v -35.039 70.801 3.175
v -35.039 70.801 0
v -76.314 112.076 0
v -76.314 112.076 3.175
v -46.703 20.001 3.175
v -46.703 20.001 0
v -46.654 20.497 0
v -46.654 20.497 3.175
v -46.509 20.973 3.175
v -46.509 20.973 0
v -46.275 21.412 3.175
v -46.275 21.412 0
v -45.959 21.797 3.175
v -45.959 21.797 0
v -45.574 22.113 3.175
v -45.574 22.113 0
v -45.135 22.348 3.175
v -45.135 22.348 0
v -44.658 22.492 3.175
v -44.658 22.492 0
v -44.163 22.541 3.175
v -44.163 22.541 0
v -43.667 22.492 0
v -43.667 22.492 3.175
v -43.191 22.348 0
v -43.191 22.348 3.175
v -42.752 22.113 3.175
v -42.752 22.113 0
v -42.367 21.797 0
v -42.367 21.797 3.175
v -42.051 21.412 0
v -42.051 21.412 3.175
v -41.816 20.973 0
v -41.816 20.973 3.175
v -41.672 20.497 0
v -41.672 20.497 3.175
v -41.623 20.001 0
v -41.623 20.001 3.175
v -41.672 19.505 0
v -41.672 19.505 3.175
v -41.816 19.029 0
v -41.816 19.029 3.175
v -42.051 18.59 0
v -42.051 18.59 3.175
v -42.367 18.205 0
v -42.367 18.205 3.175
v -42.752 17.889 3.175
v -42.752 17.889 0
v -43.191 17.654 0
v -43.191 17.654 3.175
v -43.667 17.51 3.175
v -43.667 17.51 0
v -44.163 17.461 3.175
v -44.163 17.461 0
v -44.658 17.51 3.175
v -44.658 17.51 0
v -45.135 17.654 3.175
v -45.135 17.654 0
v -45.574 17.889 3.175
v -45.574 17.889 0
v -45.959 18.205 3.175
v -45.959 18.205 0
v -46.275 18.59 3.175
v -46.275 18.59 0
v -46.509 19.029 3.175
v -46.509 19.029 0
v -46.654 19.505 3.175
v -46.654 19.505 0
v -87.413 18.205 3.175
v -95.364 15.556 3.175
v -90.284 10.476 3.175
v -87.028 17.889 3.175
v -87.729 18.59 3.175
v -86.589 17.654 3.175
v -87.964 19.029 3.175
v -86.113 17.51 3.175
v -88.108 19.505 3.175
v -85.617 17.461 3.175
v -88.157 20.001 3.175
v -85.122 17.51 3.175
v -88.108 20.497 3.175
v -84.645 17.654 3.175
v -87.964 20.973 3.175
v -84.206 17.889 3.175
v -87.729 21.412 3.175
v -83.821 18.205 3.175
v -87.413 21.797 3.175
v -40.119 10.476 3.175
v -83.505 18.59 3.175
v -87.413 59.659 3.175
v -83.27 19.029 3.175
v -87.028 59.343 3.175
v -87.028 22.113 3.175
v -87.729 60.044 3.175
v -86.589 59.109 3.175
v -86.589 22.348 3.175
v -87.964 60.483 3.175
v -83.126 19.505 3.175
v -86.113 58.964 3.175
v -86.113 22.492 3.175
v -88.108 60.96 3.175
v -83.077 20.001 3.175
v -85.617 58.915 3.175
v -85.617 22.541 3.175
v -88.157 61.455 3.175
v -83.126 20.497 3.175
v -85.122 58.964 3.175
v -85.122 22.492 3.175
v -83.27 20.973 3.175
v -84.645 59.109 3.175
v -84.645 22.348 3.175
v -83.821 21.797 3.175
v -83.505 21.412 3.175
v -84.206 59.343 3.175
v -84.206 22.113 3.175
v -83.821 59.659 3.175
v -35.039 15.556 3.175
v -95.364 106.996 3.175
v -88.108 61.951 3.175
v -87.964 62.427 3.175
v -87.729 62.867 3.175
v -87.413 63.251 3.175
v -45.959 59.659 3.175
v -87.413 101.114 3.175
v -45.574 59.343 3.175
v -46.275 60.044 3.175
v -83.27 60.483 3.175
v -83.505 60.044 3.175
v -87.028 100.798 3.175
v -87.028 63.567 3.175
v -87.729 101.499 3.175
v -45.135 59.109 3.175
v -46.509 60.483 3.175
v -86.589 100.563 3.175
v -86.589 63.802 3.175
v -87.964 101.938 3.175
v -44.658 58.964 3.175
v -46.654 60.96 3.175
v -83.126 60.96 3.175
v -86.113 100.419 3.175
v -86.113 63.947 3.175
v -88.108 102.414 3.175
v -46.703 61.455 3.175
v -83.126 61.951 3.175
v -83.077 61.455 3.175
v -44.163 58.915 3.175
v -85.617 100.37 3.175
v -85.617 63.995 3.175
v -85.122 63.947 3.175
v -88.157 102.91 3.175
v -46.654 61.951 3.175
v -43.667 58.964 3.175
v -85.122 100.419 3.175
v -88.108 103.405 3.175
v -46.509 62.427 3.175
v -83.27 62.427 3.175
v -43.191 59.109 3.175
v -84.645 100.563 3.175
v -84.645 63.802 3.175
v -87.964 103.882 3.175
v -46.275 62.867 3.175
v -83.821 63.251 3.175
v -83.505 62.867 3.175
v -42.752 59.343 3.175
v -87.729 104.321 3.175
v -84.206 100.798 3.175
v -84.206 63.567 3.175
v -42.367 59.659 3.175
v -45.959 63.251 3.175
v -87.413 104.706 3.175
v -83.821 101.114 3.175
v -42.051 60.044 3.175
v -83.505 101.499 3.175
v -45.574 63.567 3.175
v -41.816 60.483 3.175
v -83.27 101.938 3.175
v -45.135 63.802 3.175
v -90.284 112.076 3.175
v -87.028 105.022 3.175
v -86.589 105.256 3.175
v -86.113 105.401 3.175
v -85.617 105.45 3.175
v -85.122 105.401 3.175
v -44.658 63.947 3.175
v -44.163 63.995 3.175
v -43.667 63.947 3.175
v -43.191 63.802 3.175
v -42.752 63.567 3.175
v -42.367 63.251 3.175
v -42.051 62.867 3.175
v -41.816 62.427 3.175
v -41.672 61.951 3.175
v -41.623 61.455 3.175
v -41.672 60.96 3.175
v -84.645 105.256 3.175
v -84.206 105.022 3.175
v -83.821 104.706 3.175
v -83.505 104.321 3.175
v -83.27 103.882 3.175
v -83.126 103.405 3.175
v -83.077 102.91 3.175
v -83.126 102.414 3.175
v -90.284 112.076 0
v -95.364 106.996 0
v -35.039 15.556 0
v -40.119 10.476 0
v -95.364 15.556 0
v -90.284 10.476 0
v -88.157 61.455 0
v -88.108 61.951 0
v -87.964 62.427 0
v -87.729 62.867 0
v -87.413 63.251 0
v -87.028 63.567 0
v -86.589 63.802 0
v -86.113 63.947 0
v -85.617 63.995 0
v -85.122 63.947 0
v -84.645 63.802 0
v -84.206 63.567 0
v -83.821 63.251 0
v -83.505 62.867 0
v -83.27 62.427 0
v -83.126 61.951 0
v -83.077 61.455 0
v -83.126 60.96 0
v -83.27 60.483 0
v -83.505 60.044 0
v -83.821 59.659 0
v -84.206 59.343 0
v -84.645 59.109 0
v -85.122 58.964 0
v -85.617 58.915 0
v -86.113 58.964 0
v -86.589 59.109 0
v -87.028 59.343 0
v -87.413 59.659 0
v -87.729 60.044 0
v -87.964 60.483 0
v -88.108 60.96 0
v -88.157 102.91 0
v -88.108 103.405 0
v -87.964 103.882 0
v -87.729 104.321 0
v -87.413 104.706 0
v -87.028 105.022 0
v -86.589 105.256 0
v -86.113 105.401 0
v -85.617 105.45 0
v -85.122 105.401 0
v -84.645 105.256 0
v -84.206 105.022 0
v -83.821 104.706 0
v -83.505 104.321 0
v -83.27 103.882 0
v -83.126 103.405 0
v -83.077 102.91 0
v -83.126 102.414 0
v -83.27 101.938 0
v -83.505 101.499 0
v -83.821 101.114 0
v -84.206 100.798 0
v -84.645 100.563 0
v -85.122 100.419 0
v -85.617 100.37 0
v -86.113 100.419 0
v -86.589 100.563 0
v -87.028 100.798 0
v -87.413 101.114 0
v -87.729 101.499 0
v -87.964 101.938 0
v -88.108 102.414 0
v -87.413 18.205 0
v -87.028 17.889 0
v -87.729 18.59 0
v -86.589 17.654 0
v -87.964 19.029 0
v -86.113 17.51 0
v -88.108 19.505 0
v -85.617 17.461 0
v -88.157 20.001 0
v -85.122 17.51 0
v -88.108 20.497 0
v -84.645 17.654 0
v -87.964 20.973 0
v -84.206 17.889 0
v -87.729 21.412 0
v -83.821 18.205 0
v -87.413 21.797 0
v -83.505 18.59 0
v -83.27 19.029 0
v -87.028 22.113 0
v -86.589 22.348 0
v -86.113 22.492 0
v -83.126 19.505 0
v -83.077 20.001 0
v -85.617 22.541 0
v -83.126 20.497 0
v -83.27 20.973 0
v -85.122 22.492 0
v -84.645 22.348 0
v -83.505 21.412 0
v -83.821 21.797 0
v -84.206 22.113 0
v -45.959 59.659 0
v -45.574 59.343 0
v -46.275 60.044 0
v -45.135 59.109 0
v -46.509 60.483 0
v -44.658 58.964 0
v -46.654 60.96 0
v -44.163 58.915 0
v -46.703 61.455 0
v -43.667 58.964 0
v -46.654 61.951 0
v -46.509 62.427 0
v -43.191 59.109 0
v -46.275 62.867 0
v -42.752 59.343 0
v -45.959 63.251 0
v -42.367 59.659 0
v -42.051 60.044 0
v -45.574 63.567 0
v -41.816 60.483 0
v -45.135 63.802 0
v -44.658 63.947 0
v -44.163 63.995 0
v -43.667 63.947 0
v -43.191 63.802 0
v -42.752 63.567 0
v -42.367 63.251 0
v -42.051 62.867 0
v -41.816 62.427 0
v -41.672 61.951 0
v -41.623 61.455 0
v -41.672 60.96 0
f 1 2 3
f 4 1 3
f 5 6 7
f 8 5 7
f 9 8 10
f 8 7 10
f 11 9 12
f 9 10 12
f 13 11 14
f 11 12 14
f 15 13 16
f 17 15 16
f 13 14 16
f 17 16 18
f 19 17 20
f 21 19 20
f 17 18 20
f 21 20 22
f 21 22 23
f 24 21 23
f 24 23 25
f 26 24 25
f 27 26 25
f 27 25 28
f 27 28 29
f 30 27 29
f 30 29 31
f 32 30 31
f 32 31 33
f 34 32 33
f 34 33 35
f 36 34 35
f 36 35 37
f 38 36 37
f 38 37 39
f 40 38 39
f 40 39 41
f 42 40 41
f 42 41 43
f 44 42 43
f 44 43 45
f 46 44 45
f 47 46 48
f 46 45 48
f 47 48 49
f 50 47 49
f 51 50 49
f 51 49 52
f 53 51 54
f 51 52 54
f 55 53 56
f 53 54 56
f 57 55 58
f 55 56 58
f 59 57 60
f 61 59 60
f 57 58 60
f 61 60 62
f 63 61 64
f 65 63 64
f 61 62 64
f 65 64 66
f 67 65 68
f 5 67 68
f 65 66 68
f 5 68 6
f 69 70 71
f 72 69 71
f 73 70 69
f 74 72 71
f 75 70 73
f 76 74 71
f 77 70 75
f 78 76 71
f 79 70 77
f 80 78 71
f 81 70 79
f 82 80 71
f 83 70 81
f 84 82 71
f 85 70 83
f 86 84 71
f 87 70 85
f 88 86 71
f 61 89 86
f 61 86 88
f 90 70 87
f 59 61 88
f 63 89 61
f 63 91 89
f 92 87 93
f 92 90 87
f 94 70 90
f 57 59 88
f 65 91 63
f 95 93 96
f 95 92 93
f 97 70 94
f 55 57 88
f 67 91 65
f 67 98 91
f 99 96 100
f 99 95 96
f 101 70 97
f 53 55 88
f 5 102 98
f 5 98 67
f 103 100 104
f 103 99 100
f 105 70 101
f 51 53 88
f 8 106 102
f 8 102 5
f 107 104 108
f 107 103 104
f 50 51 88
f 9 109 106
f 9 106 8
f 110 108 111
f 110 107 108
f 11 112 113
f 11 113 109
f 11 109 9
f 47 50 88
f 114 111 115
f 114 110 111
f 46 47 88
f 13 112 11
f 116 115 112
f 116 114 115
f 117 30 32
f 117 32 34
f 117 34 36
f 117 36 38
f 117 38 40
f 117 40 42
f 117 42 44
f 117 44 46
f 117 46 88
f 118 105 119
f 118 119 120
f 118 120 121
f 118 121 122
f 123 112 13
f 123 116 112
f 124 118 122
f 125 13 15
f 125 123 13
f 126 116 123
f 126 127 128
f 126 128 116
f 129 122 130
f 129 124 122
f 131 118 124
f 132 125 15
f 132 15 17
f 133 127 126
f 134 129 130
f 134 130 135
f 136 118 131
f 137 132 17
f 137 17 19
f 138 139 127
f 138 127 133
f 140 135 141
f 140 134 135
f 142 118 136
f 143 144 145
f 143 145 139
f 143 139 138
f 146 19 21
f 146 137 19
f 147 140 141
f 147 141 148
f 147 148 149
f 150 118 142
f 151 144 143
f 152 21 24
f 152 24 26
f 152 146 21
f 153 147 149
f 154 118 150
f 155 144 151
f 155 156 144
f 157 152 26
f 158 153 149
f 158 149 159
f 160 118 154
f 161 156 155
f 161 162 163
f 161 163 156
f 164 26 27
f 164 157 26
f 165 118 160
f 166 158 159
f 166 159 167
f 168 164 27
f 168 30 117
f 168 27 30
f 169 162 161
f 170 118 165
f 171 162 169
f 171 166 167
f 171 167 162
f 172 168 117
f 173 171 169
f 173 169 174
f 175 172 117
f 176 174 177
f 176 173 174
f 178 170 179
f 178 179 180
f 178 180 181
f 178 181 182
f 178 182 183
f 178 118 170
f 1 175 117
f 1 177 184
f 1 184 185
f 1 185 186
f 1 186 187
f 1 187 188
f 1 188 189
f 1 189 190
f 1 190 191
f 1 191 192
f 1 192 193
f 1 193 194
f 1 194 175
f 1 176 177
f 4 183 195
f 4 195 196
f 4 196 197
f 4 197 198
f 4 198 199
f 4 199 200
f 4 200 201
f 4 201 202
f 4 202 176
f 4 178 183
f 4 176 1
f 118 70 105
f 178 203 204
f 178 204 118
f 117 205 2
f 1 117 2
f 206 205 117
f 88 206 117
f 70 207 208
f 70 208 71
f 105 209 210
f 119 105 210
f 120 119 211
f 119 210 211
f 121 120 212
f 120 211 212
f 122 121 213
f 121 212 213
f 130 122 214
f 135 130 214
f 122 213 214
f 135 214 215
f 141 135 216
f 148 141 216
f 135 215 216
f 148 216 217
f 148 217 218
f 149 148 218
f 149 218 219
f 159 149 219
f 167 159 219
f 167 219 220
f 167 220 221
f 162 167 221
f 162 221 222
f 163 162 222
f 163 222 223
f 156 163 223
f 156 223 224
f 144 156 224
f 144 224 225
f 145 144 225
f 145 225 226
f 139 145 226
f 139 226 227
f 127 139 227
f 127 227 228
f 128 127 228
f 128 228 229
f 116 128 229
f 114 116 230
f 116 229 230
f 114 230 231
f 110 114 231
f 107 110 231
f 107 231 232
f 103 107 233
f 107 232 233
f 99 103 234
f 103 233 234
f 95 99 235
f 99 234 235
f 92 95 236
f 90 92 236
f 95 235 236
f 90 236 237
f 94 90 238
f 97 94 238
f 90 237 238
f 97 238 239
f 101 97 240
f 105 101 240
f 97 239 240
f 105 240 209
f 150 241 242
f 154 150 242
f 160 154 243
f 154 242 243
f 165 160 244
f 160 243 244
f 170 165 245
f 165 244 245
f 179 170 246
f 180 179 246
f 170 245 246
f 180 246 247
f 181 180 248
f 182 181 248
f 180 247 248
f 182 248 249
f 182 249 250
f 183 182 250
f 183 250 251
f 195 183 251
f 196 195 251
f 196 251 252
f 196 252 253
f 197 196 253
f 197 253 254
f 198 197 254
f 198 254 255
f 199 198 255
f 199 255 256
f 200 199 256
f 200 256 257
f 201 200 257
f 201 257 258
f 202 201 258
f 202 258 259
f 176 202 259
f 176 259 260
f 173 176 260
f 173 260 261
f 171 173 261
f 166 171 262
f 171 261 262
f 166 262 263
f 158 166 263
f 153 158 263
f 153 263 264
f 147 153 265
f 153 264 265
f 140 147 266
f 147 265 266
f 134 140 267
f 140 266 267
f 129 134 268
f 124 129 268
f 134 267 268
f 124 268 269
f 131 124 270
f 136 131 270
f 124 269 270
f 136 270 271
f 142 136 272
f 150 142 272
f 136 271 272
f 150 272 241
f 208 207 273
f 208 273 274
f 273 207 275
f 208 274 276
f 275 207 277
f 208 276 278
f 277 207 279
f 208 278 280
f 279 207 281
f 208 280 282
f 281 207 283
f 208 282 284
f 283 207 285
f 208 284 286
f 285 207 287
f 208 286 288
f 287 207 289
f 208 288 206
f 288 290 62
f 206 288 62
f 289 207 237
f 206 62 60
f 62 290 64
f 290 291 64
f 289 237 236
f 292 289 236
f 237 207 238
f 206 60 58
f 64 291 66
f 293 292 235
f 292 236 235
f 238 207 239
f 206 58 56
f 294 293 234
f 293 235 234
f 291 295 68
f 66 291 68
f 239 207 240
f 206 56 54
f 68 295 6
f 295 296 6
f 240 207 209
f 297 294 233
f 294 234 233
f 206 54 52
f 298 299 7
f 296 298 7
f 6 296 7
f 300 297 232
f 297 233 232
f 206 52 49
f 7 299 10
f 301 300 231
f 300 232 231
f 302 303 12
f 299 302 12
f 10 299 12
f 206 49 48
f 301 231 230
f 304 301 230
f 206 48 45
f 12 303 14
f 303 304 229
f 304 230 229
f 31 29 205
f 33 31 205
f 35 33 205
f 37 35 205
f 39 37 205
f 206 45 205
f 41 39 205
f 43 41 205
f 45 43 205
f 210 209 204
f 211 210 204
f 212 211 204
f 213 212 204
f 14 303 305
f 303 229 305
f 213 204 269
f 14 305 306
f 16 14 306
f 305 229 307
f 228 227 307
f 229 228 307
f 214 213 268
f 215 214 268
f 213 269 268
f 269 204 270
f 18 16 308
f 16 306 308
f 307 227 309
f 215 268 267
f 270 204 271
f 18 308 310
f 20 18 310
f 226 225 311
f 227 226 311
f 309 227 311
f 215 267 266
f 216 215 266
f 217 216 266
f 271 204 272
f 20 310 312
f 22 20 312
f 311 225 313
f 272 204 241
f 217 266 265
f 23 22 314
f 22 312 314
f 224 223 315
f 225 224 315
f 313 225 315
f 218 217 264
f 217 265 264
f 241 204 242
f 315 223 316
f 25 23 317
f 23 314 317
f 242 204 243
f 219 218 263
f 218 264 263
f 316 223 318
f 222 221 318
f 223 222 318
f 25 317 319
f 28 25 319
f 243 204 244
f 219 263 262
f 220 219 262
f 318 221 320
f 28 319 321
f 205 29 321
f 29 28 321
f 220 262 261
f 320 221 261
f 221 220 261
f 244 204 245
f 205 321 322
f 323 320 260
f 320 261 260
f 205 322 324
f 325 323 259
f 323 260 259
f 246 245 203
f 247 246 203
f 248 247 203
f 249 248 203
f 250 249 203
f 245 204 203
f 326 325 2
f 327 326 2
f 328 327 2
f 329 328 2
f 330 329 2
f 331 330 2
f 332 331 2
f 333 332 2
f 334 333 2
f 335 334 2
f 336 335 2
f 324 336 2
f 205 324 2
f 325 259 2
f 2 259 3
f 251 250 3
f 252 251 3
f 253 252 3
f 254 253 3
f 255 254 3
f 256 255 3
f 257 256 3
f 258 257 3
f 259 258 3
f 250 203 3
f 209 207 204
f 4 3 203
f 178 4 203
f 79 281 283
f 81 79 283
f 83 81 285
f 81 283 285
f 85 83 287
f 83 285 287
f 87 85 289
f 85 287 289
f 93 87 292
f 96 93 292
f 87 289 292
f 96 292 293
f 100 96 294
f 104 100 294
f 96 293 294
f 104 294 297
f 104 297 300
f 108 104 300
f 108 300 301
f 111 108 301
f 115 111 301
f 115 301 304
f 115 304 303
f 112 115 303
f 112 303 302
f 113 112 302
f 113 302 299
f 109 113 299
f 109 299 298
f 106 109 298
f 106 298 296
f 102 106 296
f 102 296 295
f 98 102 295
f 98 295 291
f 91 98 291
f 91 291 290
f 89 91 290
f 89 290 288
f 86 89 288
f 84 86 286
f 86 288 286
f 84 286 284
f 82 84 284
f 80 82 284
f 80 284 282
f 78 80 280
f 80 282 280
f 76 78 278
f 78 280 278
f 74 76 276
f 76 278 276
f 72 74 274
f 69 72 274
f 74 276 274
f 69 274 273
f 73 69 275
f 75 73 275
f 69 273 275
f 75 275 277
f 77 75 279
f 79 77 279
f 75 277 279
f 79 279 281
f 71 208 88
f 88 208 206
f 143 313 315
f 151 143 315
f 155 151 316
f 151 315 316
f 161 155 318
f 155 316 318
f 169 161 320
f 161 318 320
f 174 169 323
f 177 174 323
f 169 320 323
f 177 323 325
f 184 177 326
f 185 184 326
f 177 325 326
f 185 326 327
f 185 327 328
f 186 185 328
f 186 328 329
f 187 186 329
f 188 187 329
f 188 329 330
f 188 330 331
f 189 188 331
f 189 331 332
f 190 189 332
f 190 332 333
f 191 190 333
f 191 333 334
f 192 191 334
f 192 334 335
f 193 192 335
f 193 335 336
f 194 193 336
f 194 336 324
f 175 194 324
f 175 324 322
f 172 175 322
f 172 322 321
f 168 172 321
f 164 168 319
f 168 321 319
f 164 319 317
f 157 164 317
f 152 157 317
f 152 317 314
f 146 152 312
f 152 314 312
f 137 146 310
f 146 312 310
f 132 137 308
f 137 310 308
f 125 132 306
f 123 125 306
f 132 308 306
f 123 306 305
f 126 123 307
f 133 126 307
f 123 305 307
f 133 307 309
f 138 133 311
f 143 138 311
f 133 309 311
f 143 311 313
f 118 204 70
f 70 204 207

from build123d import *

# Parameters (mm, degrees)
BOSS_EXTRUDE1_DEPTH = 3.175
SKETCH2_R           = 2.54
CUT_EXTRUDE1_DEPTH  = 4.175
CHAMFER1_SIZE       = 5.08


with BuildPart() as part:
    # Sketch1 → Boss-Extrude1 (new body)
    with BuildSketch(Plane.XY):
        Polygon((-95.364356197, 10.475976437), (-35.039356197, 10.475976437), (-35.039356197, 70.800976437), (-76.314356197, 112.075976437), (-95.364356197, 112.075976437), align=None)
    extrude(amount=BOSS_EXTRUDE1_DEPTH)

    # Sketch2 → Cut-Extrude1 (cut, through all)
    with BuildSketch(Plane(origin=(0, 0, 0), x_dir=(-1, 0, 0), z_dir=(0, 0, -1))):
        with Locations((44.162734276, 20.000976437)):
            Circle(SKETCH2_R)
        with Locations((85.617120669, 20.000976437)):
            Circle(SKETCH2_R)
        with Locations((85.617120669, 61.45536283)):
            Circle(SKETCH2_R)
        with Locations((85.617120669, 102.909749223)):
            Circle(SKETCH2_R)
        with Locations((44.162734276, 61.45536283)):
            Circle(SKETCH2_R)
    extrude(amount=-CUT_EXTRUDE1_DEPTH, mode=Mode.SUBTRACT)

    # Chamfer1
    chamfer1_edges = [part.edges().sort_by_distance(p)[0] for p in [
        (-95.364356197, 112.075976437, 1.5875),
        (-35.039356197, 10.475976437, 1.5875),
        (-95.364356197, 10.475976437, 1.5875),
    ]]
    chamfer(chamfer1_edges, length=CHAMFER1_SIZE)


solid = part.part
